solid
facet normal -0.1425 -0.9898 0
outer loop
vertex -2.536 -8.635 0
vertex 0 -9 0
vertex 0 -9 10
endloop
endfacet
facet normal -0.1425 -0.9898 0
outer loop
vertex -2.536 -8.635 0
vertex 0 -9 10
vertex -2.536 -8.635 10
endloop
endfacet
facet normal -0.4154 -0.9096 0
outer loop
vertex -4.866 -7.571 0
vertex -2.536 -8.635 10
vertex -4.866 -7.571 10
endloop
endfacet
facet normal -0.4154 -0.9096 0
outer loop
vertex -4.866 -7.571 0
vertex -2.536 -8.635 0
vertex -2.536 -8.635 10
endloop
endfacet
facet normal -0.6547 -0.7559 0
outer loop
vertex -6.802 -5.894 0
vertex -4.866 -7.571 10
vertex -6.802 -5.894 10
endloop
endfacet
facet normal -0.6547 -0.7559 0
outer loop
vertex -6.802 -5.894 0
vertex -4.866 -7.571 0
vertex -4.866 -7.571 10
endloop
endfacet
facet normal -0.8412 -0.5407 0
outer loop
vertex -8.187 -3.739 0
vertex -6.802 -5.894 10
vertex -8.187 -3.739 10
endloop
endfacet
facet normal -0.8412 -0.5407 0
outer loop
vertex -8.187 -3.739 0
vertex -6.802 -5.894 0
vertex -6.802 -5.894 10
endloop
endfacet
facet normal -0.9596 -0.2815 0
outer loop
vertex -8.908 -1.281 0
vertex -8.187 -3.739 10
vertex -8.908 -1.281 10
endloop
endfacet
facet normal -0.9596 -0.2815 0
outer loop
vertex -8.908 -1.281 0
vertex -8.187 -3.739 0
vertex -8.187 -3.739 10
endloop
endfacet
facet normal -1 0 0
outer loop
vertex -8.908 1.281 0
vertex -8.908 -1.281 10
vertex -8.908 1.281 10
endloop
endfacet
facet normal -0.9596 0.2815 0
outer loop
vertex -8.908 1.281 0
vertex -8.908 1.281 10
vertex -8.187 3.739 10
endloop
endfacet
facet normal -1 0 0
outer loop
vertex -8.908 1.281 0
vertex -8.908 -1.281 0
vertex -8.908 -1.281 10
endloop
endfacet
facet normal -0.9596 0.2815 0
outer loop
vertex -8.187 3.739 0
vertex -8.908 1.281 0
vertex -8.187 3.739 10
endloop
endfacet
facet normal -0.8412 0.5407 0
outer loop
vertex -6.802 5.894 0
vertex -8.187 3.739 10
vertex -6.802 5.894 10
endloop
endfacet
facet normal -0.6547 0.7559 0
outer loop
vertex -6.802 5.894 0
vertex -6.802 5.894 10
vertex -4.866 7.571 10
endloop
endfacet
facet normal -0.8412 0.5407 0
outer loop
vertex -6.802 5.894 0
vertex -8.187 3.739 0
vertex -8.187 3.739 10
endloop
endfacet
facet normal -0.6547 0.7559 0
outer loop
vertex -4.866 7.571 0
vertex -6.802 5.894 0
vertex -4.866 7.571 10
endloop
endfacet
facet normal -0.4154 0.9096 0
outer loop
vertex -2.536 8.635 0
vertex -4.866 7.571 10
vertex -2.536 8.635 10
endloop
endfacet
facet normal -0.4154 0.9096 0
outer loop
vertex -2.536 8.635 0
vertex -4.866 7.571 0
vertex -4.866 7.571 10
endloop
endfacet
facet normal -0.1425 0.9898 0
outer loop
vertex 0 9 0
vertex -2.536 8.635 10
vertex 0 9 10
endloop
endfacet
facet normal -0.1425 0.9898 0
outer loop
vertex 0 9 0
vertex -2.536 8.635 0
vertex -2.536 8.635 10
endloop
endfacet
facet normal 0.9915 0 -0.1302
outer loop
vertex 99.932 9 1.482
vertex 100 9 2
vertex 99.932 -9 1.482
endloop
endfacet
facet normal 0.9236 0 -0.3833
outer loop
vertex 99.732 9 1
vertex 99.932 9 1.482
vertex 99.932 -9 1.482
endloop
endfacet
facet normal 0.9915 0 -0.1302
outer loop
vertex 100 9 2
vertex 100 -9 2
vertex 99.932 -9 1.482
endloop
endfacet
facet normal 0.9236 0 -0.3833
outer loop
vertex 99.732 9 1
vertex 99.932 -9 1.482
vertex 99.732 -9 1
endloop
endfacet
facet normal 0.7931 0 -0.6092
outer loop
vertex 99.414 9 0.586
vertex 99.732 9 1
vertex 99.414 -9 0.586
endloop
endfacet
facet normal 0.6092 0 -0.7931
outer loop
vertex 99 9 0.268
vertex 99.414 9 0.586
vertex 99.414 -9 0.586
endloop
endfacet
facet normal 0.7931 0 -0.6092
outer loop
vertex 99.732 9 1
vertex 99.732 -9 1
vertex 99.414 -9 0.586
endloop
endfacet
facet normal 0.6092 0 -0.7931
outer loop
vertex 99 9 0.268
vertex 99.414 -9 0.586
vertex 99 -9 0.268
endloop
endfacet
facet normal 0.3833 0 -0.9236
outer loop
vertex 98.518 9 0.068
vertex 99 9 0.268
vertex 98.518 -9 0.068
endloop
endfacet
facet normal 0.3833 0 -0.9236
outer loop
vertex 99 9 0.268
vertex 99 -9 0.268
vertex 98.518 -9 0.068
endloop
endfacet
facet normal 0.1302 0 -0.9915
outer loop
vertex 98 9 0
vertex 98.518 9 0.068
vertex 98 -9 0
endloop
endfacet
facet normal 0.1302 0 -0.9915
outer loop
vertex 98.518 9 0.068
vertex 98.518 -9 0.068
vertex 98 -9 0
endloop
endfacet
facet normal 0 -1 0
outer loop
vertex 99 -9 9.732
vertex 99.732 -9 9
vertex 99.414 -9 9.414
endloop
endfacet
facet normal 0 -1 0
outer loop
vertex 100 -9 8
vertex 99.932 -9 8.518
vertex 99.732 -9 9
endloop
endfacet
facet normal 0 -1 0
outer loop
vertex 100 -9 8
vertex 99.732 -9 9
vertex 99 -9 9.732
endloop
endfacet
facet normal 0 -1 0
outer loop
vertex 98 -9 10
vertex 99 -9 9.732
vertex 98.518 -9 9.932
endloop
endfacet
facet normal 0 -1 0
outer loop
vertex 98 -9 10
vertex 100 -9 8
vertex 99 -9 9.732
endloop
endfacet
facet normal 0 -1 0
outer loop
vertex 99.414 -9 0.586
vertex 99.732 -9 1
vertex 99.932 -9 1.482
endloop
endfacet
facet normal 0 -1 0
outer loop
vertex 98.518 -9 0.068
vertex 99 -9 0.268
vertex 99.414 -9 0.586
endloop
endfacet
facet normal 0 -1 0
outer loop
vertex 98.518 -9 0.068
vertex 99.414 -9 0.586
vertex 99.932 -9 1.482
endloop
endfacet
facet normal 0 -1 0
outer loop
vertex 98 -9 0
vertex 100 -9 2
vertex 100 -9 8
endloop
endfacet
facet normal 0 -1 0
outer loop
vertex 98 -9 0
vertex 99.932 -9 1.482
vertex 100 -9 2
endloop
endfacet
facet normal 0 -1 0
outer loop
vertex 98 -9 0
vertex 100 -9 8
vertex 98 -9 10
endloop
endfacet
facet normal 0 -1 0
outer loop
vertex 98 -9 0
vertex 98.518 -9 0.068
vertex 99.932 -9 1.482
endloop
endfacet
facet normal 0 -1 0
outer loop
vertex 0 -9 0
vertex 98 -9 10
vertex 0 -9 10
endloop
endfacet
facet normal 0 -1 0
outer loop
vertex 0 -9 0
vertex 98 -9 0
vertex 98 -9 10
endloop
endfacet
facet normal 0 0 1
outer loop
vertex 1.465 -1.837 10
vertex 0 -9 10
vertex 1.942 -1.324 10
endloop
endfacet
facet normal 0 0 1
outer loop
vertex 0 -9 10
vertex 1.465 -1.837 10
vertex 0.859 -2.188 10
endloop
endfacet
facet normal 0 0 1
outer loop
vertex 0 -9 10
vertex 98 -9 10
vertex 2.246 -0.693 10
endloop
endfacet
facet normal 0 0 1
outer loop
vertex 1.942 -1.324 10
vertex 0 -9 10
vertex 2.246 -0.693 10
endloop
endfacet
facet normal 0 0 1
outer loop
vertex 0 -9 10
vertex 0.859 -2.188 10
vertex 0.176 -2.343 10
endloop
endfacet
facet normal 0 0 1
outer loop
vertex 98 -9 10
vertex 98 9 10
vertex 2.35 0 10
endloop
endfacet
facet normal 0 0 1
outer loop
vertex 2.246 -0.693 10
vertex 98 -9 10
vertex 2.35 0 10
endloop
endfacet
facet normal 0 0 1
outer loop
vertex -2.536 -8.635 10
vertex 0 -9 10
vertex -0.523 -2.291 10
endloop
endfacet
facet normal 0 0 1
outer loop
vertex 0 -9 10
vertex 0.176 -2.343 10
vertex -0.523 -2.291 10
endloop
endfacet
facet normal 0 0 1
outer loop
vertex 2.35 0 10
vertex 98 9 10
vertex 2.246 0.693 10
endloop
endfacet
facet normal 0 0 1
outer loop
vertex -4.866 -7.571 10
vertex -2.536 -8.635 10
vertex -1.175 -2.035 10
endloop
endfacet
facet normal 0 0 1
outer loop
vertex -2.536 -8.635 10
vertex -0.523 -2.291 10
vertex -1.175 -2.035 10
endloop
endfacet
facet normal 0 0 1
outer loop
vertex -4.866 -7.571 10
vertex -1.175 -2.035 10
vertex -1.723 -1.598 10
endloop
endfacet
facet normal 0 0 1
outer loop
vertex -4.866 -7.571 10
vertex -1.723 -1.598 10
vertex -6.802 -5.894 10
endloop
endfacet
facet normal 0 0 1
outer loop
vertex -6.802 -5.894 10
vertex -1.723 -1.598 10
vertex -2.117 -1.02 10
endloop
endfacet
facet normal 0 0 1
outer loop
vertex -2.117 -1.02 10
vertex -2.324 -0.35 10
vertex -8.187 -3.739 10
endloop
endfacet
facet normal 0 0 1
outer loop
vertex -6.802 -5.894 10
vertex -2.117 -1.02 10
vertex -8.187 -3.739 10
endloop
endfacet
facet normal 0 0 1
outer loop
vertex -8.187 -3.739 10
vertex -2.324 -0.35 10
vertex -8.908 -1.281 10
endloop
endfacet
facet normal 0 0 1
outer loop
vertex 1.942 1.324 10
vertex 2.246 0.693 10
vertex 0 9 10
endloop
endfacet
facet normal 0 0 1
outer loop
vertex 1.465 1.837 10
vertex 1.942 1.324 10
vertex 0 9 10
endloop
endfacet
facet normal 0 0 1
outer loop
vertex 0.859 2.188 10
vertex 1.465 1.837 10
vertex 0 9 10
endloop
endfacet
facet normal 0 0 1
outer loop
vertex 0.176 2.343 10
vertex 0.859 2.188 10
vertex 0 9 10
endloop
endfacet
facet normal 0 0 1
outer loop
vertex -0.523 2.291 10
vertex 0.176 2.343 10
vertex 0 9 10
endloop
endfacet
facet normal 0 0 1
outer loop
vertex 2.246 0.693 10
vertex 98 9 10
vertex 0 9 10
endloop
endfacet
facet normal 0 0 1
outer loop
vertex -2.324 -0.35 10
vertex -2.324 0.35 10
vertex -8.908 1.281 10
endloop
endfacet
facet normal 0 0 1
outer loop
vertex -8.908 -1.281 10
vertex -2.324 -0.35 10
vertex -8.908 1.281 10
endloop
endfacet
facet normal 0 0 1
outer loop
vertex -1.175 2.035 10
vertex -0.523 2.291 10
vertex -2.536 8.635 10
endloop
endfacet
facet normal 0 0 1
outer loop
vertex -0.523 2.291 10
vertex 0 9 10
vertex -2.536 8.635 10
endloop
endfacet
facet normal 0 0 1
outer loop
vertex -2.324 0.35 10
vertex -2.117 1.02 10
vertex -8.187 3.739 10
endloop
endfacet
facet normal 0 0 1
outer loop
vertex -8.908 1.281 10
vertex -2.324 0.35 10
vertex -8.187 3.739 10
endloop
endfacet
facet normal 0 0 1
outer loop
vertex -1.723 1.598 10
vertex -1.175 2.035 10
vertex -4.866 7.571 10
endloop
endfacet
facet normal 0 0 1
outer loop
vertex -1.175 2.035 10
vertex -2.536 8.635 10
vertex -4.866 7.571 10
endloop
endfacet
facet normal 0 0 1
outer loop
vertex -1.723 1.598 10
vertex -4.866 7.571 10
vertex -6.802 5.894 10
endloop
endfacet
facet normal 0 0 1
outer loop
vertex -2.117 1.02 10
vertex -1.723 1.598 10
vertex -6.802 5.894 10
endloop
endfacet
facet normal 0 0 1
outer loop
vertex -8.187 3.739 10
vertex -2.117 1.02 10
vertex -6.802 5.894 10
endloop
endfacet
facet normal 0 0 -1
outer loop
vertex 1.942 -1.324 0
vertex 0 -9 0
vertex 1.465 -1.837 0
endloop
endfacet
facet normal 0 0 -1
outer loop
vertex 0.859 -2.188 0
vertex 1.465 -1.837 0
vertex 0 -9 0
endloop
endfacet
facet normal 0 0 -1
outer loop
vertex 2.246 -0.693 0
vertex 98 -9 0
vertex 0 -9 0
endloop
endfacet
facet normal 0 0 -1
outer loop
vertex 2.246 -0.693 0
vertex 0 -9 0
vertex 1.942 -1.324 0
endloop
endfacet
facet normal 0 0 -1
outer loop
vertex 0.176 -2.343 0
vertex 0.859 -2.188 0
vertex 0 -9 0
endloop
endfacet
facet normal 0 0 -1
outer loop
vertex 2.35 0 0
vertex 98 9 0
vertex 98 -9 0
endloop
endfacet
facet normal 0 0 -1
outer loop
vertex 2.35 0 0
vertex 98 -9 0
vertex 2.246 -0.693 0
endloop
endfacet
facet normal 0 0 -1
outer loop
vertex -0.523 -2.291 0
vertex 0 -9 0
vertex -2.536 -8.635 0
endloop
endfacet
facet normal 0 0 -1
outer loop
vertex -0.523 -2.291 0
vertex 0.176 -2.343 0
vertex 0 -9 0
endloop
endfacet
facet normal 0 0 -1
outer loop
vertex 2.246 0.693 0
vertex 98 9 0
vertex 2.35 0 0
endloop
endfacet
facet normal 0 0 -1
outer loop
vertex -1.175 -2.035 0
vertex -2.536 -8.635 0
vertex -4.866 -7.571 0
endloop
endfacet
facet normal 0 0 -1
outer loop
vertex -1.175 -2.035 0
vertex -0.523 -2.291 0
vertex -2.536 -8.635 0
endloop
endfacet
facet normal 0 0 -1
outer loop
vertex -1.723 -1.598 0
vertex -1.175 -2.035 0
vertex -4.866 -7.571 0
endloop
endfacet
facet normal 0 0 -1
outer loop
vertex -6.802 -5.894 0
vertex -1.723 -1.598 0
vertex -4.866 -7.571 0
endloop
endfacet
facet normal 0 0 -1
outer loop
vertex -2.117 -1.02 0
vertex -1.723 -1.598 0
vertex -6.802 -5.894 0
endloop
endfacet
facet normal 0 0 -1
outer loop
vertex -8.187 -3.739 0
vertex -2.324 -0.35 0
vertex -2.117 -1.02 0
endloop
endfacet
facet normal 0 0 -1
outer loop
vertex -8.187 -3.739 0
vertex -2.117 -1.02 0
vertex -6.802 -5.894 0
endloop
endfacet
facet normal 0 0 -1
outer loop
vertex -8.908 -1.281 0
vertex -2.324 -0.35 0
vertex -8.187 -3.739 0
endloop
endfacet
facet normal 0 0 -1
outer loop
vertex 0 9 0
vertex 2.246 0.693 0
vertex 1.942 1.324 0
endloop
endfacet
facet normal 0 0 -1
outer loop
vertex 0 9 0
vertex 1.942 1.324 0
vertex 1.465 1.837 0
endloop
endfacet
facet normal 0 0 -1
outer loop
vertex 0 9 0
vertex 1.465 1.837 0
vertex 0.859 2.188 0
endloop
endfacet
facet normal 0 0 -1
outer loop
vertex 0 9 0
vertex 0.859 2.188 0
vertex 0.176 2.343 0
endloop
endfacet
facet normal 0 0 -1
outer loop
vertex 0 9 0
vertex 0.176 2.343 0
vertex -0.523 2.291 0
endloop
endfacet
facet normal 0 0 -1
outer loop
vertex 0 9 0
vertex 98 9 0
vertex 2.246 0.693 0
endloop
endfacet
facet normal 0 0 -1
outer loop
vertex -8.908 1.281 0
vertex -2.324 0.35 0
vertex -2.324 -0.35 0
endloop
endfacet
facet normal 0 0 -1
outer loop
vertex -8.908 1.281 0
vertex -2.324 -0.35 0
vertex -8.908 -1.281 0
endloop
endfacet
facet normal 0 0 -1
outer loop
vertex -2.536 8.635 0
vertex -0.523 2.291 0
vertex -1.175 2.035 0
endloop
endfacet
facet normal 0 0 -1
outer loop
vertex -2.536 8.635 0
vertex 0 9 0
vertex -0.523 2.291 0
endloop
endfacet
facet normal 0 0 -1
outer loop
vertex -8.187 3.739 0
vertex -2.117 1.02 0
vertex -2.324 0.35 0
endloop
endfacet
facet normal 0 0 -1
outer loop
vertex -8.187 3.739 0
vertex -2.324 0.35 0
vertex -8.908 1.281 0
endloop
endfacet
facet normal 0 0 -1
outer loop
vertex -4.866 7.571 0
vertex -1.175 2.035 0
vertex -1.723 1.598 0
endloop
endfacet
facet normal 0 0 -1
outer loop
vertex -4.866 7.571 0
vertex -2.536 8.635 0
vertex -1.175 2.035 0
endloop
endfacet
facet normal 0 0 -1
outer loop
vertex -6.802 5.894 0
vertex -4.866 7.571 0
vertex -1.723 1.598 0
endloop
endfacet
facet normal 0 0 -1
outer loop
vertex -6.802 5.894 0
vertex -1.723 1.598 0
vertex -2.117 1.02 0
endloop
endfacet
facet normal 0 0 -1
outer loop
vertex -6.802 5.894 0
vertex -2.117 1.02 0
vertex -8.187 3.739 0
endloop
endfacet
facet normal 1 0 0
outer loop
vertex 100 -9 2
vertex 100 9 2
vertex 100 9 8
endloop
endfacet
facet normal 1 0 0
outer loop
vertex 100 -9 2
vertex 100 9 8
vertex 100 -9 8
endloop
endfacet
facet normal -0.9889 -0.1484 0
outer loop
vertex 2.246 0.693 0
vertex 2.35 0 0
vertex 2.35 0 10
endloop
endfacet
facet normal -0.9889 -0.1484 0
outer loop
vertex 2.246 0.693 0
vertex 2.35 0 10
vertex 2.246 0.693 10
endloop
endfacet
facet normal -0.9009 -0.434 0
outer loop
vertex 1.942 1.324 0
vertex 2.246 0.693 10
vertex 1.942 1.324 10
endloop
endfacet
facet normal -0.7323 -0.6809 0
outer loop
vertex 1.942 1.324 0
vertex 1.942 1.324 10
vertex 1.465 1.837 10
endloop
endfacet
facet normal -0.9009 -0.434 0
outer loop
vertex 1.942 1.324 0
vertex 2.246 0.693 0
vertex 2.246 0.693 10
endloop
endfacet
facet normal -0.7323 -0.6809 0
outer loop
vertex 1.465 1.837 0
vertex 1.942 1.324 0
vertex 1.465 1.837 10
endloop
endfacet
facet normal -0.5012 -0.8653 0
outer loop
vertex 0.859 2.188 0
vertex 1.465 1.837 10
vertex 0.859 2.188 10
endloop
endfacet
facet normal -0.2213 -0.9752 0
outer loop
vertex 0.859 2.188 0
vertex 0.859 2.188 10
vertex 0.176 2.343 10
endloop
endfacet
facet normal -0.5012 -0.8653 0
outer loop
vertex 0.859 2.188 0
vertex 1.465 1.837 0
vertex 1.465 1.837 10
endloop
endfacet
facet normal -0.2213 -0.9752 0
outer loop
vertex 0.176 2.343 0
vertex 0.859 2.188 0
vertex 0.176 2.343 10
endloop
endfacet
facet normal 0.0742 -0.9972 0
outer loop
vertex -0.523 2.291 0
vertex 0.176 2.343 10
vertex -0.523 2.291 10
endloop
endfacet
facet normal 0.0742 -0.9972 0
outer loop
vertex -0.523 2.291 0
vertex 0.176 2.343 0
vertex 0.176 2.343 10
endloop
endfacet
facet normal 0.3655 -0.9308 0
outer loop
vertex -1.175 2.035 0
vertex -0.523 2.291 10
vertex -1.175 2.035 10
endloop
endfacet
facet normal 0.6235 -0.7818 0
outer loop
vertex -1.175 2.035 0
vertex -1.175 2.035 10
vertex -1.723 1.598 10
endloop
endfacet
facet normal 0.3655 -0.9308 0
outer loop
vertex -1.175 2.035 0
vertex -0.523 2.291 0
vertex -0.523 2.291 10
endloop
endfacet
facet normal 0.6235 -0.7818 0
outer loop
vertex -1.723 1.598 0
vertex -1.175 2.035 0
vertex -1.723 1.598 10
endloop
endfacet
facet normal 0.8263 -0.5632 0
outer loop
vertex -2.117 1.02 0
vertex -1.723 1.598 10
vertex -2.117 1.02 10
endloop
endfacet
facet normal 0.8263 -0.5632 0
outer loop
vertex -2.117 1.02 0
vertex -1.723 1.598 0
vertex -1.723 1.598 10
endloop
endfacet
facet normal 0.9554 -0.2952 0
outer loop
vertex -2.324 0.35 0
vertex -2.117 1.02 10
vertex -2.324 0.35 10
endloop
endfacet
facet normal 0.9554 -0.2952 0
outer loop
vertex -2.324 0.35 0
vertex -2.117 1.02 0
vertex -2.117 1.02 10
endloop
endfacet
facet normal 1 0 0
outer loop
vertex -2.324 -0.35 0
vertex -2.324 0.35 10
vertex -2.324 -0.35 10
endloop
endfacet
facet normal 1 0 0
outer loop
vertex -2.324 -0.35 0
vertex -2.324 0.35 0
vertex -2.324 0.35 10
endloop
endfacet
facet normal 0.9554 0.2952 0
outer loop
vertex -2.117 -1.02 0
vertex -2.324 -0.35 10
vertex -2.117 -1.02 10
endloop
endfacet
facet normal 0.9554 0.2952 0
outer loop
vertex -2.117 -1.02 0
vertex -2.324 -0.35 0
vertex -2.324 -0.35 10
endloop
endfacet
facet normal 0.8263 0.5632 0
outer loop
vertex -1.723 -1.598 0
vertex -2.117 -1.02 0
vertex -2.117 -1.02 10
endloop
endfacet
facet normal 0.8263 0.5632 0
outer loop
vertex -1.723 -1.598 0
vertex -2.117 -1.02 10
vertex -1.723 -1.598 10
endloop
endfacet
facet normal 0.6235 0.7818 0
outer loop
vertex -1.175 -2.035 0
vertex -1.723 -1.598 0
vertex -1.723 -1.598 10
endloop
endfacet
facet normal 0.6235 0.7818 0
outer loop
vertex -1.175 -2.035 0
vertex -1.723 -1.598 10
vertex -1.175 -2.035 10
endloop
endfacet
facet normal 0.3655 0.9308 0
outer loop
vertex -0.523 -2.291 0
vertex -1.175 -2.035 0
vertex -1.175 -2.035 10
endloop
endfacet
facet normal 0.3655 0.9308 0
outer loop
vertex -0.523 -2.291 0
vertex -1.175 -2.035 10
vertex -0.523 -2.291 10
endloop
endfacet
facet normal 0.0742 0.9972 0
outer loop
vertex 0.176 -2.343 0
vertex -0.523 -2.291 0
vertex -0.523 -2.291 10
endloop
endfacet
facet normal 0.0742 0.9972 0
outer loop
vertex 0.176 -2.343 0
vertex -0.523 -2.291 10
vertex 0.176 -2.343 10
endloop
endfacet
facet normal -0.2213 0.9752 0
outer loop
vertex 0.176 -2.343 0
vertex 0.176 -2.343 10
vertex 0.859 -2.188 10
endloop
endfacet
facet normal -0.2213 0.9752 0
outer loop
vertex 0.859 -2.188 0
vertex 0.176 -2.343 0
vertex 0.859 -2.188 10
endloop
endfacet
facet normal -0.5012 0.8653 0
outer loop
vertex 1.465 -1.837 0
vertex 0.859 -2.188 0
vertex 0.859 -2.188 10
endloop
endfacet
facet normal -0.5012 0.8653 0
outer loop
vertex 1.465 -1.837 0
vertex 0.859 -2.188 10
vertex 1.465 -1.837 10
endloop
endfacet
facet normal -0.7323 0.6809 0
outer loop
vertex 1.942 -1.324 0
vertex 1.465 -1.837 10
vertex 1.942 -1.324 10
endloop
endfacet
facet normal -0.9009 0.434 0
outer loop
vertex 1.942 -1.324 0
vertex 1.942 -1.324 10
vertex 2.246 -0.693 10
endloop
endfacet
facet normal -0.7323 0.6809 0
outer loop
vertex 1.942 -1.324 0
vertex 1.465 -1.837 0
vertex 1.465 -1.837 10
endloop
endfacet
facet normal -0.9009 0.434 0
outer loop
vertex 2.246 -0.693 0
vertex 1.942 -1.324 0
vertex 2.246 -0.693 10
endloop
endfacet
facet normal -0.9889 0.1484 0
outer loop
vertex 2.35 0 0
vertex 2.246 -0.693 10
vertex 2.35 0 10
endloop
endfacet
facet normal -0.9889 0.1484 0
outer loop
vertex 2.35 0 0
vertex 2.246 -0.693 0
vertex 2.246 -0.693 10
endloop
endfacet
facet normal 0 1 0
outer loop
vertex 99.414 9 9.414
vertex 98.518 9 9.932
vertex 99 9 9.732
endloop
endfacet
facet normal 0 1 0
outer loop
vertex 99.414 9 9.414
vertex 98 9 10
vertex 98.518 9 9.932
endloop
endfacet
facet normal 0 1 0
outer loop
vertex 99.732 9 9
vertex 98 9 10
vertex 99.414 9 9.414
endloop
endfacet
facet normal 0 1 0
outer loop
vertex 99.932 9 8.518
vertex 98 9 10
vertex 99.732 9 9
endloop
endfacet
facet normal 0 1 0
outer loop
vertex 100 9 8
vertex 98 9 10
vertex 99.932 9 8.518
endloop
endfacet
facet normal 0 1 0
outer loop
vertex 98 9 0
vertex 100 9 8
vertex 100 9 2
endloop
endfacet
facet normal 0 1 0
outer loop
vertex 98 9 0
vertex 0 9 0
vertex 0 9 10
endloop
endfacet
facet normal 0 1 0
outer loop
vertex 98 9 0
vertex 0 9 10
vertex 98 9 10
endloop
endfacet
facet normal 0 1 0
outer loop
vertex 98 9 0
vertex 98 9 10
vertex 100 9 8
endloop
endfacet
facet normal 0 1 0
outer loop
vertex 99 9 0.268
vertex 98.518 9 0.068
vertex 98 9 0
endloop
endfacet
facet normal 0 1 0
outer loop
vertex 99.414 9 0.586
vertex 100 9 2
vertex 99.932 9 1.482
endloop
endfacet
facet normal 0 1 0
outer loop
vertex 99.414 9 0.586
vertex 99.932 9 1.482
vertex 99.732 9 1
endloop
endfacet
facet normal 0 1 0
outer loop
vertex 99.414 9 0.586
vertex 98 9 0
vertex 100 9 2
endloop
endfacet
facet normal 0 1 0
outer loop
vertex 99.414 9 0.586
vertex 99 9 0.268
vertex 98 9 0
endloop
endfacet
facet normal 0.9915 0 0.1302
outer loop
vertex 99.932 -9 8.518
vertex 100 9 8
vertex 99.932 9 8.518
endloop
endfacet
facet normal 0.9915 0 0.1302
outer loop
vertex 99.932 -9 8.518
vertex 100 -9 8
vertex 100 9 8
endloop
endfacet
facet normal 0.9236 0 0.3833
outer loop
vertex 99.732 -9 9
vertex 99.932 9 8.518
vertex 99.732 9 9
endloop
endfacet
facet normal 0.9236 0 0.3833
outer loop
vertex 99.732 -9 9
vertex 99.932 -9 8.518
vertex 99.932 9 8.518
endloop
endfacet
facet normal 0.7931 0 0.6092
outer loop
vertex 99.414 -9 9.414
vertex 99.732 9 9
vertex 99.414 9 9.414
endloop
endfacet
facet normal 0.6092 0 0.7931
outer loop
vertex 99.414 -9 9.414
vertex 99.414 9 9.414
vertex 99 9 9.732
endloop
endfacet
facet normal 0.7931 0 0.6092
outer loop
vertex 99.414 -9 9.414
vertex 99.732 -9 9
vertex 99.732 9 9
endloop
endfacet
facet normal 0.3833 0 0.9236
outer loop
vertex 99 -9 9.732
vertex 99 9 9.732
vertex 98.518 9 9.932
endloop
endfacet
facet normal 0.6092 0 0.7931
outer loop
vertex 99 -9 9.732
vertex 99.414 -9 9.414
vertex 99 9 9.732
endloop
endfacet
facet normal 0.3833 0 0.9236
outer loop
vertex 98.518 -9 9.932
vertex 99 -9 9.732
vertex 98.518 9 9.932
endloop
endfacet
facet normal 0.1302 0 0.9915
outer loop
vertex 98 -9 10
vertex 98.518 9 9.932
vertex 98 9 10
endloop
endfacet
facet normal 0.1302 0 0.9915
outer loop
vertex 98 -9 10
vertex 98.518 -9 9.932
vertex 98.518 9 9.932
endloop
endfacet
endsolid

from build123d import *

# Parameters (mm, degrees)
ESQUISSE1_R        = 2.35
BOSS_EXTRU_1_DEPTH = 10
CONG_1_R           = 2


with BuildPart() as part:
    # Esquisse1 → Boss.-Extru.1 (new body)
    with BuildSketch(Plane.XY):
        with BuildLine():
            Line((0, 9), (100, 9))
            Line((100, 9), (100, -9))
            Line((100, -9), (0, -9))
            ThreePointArc((0, -9), (-9, 0), (0, 9))
        make_face()
        Circle(ESQUISSE1_R, mode=Mode.SUBTRACT)
    extrude(amount=BOSS_EXTRU_1_DEPTH)

    # Congé1
    cong_1_edges = [part.edges().sort_by_distance(p)[0] for p in [
        (100, 0, 10),
        (100, 0, 0),
    ]]
    fillet(cong_1_edges, radius=CONG_1_R)


solid = part.part
